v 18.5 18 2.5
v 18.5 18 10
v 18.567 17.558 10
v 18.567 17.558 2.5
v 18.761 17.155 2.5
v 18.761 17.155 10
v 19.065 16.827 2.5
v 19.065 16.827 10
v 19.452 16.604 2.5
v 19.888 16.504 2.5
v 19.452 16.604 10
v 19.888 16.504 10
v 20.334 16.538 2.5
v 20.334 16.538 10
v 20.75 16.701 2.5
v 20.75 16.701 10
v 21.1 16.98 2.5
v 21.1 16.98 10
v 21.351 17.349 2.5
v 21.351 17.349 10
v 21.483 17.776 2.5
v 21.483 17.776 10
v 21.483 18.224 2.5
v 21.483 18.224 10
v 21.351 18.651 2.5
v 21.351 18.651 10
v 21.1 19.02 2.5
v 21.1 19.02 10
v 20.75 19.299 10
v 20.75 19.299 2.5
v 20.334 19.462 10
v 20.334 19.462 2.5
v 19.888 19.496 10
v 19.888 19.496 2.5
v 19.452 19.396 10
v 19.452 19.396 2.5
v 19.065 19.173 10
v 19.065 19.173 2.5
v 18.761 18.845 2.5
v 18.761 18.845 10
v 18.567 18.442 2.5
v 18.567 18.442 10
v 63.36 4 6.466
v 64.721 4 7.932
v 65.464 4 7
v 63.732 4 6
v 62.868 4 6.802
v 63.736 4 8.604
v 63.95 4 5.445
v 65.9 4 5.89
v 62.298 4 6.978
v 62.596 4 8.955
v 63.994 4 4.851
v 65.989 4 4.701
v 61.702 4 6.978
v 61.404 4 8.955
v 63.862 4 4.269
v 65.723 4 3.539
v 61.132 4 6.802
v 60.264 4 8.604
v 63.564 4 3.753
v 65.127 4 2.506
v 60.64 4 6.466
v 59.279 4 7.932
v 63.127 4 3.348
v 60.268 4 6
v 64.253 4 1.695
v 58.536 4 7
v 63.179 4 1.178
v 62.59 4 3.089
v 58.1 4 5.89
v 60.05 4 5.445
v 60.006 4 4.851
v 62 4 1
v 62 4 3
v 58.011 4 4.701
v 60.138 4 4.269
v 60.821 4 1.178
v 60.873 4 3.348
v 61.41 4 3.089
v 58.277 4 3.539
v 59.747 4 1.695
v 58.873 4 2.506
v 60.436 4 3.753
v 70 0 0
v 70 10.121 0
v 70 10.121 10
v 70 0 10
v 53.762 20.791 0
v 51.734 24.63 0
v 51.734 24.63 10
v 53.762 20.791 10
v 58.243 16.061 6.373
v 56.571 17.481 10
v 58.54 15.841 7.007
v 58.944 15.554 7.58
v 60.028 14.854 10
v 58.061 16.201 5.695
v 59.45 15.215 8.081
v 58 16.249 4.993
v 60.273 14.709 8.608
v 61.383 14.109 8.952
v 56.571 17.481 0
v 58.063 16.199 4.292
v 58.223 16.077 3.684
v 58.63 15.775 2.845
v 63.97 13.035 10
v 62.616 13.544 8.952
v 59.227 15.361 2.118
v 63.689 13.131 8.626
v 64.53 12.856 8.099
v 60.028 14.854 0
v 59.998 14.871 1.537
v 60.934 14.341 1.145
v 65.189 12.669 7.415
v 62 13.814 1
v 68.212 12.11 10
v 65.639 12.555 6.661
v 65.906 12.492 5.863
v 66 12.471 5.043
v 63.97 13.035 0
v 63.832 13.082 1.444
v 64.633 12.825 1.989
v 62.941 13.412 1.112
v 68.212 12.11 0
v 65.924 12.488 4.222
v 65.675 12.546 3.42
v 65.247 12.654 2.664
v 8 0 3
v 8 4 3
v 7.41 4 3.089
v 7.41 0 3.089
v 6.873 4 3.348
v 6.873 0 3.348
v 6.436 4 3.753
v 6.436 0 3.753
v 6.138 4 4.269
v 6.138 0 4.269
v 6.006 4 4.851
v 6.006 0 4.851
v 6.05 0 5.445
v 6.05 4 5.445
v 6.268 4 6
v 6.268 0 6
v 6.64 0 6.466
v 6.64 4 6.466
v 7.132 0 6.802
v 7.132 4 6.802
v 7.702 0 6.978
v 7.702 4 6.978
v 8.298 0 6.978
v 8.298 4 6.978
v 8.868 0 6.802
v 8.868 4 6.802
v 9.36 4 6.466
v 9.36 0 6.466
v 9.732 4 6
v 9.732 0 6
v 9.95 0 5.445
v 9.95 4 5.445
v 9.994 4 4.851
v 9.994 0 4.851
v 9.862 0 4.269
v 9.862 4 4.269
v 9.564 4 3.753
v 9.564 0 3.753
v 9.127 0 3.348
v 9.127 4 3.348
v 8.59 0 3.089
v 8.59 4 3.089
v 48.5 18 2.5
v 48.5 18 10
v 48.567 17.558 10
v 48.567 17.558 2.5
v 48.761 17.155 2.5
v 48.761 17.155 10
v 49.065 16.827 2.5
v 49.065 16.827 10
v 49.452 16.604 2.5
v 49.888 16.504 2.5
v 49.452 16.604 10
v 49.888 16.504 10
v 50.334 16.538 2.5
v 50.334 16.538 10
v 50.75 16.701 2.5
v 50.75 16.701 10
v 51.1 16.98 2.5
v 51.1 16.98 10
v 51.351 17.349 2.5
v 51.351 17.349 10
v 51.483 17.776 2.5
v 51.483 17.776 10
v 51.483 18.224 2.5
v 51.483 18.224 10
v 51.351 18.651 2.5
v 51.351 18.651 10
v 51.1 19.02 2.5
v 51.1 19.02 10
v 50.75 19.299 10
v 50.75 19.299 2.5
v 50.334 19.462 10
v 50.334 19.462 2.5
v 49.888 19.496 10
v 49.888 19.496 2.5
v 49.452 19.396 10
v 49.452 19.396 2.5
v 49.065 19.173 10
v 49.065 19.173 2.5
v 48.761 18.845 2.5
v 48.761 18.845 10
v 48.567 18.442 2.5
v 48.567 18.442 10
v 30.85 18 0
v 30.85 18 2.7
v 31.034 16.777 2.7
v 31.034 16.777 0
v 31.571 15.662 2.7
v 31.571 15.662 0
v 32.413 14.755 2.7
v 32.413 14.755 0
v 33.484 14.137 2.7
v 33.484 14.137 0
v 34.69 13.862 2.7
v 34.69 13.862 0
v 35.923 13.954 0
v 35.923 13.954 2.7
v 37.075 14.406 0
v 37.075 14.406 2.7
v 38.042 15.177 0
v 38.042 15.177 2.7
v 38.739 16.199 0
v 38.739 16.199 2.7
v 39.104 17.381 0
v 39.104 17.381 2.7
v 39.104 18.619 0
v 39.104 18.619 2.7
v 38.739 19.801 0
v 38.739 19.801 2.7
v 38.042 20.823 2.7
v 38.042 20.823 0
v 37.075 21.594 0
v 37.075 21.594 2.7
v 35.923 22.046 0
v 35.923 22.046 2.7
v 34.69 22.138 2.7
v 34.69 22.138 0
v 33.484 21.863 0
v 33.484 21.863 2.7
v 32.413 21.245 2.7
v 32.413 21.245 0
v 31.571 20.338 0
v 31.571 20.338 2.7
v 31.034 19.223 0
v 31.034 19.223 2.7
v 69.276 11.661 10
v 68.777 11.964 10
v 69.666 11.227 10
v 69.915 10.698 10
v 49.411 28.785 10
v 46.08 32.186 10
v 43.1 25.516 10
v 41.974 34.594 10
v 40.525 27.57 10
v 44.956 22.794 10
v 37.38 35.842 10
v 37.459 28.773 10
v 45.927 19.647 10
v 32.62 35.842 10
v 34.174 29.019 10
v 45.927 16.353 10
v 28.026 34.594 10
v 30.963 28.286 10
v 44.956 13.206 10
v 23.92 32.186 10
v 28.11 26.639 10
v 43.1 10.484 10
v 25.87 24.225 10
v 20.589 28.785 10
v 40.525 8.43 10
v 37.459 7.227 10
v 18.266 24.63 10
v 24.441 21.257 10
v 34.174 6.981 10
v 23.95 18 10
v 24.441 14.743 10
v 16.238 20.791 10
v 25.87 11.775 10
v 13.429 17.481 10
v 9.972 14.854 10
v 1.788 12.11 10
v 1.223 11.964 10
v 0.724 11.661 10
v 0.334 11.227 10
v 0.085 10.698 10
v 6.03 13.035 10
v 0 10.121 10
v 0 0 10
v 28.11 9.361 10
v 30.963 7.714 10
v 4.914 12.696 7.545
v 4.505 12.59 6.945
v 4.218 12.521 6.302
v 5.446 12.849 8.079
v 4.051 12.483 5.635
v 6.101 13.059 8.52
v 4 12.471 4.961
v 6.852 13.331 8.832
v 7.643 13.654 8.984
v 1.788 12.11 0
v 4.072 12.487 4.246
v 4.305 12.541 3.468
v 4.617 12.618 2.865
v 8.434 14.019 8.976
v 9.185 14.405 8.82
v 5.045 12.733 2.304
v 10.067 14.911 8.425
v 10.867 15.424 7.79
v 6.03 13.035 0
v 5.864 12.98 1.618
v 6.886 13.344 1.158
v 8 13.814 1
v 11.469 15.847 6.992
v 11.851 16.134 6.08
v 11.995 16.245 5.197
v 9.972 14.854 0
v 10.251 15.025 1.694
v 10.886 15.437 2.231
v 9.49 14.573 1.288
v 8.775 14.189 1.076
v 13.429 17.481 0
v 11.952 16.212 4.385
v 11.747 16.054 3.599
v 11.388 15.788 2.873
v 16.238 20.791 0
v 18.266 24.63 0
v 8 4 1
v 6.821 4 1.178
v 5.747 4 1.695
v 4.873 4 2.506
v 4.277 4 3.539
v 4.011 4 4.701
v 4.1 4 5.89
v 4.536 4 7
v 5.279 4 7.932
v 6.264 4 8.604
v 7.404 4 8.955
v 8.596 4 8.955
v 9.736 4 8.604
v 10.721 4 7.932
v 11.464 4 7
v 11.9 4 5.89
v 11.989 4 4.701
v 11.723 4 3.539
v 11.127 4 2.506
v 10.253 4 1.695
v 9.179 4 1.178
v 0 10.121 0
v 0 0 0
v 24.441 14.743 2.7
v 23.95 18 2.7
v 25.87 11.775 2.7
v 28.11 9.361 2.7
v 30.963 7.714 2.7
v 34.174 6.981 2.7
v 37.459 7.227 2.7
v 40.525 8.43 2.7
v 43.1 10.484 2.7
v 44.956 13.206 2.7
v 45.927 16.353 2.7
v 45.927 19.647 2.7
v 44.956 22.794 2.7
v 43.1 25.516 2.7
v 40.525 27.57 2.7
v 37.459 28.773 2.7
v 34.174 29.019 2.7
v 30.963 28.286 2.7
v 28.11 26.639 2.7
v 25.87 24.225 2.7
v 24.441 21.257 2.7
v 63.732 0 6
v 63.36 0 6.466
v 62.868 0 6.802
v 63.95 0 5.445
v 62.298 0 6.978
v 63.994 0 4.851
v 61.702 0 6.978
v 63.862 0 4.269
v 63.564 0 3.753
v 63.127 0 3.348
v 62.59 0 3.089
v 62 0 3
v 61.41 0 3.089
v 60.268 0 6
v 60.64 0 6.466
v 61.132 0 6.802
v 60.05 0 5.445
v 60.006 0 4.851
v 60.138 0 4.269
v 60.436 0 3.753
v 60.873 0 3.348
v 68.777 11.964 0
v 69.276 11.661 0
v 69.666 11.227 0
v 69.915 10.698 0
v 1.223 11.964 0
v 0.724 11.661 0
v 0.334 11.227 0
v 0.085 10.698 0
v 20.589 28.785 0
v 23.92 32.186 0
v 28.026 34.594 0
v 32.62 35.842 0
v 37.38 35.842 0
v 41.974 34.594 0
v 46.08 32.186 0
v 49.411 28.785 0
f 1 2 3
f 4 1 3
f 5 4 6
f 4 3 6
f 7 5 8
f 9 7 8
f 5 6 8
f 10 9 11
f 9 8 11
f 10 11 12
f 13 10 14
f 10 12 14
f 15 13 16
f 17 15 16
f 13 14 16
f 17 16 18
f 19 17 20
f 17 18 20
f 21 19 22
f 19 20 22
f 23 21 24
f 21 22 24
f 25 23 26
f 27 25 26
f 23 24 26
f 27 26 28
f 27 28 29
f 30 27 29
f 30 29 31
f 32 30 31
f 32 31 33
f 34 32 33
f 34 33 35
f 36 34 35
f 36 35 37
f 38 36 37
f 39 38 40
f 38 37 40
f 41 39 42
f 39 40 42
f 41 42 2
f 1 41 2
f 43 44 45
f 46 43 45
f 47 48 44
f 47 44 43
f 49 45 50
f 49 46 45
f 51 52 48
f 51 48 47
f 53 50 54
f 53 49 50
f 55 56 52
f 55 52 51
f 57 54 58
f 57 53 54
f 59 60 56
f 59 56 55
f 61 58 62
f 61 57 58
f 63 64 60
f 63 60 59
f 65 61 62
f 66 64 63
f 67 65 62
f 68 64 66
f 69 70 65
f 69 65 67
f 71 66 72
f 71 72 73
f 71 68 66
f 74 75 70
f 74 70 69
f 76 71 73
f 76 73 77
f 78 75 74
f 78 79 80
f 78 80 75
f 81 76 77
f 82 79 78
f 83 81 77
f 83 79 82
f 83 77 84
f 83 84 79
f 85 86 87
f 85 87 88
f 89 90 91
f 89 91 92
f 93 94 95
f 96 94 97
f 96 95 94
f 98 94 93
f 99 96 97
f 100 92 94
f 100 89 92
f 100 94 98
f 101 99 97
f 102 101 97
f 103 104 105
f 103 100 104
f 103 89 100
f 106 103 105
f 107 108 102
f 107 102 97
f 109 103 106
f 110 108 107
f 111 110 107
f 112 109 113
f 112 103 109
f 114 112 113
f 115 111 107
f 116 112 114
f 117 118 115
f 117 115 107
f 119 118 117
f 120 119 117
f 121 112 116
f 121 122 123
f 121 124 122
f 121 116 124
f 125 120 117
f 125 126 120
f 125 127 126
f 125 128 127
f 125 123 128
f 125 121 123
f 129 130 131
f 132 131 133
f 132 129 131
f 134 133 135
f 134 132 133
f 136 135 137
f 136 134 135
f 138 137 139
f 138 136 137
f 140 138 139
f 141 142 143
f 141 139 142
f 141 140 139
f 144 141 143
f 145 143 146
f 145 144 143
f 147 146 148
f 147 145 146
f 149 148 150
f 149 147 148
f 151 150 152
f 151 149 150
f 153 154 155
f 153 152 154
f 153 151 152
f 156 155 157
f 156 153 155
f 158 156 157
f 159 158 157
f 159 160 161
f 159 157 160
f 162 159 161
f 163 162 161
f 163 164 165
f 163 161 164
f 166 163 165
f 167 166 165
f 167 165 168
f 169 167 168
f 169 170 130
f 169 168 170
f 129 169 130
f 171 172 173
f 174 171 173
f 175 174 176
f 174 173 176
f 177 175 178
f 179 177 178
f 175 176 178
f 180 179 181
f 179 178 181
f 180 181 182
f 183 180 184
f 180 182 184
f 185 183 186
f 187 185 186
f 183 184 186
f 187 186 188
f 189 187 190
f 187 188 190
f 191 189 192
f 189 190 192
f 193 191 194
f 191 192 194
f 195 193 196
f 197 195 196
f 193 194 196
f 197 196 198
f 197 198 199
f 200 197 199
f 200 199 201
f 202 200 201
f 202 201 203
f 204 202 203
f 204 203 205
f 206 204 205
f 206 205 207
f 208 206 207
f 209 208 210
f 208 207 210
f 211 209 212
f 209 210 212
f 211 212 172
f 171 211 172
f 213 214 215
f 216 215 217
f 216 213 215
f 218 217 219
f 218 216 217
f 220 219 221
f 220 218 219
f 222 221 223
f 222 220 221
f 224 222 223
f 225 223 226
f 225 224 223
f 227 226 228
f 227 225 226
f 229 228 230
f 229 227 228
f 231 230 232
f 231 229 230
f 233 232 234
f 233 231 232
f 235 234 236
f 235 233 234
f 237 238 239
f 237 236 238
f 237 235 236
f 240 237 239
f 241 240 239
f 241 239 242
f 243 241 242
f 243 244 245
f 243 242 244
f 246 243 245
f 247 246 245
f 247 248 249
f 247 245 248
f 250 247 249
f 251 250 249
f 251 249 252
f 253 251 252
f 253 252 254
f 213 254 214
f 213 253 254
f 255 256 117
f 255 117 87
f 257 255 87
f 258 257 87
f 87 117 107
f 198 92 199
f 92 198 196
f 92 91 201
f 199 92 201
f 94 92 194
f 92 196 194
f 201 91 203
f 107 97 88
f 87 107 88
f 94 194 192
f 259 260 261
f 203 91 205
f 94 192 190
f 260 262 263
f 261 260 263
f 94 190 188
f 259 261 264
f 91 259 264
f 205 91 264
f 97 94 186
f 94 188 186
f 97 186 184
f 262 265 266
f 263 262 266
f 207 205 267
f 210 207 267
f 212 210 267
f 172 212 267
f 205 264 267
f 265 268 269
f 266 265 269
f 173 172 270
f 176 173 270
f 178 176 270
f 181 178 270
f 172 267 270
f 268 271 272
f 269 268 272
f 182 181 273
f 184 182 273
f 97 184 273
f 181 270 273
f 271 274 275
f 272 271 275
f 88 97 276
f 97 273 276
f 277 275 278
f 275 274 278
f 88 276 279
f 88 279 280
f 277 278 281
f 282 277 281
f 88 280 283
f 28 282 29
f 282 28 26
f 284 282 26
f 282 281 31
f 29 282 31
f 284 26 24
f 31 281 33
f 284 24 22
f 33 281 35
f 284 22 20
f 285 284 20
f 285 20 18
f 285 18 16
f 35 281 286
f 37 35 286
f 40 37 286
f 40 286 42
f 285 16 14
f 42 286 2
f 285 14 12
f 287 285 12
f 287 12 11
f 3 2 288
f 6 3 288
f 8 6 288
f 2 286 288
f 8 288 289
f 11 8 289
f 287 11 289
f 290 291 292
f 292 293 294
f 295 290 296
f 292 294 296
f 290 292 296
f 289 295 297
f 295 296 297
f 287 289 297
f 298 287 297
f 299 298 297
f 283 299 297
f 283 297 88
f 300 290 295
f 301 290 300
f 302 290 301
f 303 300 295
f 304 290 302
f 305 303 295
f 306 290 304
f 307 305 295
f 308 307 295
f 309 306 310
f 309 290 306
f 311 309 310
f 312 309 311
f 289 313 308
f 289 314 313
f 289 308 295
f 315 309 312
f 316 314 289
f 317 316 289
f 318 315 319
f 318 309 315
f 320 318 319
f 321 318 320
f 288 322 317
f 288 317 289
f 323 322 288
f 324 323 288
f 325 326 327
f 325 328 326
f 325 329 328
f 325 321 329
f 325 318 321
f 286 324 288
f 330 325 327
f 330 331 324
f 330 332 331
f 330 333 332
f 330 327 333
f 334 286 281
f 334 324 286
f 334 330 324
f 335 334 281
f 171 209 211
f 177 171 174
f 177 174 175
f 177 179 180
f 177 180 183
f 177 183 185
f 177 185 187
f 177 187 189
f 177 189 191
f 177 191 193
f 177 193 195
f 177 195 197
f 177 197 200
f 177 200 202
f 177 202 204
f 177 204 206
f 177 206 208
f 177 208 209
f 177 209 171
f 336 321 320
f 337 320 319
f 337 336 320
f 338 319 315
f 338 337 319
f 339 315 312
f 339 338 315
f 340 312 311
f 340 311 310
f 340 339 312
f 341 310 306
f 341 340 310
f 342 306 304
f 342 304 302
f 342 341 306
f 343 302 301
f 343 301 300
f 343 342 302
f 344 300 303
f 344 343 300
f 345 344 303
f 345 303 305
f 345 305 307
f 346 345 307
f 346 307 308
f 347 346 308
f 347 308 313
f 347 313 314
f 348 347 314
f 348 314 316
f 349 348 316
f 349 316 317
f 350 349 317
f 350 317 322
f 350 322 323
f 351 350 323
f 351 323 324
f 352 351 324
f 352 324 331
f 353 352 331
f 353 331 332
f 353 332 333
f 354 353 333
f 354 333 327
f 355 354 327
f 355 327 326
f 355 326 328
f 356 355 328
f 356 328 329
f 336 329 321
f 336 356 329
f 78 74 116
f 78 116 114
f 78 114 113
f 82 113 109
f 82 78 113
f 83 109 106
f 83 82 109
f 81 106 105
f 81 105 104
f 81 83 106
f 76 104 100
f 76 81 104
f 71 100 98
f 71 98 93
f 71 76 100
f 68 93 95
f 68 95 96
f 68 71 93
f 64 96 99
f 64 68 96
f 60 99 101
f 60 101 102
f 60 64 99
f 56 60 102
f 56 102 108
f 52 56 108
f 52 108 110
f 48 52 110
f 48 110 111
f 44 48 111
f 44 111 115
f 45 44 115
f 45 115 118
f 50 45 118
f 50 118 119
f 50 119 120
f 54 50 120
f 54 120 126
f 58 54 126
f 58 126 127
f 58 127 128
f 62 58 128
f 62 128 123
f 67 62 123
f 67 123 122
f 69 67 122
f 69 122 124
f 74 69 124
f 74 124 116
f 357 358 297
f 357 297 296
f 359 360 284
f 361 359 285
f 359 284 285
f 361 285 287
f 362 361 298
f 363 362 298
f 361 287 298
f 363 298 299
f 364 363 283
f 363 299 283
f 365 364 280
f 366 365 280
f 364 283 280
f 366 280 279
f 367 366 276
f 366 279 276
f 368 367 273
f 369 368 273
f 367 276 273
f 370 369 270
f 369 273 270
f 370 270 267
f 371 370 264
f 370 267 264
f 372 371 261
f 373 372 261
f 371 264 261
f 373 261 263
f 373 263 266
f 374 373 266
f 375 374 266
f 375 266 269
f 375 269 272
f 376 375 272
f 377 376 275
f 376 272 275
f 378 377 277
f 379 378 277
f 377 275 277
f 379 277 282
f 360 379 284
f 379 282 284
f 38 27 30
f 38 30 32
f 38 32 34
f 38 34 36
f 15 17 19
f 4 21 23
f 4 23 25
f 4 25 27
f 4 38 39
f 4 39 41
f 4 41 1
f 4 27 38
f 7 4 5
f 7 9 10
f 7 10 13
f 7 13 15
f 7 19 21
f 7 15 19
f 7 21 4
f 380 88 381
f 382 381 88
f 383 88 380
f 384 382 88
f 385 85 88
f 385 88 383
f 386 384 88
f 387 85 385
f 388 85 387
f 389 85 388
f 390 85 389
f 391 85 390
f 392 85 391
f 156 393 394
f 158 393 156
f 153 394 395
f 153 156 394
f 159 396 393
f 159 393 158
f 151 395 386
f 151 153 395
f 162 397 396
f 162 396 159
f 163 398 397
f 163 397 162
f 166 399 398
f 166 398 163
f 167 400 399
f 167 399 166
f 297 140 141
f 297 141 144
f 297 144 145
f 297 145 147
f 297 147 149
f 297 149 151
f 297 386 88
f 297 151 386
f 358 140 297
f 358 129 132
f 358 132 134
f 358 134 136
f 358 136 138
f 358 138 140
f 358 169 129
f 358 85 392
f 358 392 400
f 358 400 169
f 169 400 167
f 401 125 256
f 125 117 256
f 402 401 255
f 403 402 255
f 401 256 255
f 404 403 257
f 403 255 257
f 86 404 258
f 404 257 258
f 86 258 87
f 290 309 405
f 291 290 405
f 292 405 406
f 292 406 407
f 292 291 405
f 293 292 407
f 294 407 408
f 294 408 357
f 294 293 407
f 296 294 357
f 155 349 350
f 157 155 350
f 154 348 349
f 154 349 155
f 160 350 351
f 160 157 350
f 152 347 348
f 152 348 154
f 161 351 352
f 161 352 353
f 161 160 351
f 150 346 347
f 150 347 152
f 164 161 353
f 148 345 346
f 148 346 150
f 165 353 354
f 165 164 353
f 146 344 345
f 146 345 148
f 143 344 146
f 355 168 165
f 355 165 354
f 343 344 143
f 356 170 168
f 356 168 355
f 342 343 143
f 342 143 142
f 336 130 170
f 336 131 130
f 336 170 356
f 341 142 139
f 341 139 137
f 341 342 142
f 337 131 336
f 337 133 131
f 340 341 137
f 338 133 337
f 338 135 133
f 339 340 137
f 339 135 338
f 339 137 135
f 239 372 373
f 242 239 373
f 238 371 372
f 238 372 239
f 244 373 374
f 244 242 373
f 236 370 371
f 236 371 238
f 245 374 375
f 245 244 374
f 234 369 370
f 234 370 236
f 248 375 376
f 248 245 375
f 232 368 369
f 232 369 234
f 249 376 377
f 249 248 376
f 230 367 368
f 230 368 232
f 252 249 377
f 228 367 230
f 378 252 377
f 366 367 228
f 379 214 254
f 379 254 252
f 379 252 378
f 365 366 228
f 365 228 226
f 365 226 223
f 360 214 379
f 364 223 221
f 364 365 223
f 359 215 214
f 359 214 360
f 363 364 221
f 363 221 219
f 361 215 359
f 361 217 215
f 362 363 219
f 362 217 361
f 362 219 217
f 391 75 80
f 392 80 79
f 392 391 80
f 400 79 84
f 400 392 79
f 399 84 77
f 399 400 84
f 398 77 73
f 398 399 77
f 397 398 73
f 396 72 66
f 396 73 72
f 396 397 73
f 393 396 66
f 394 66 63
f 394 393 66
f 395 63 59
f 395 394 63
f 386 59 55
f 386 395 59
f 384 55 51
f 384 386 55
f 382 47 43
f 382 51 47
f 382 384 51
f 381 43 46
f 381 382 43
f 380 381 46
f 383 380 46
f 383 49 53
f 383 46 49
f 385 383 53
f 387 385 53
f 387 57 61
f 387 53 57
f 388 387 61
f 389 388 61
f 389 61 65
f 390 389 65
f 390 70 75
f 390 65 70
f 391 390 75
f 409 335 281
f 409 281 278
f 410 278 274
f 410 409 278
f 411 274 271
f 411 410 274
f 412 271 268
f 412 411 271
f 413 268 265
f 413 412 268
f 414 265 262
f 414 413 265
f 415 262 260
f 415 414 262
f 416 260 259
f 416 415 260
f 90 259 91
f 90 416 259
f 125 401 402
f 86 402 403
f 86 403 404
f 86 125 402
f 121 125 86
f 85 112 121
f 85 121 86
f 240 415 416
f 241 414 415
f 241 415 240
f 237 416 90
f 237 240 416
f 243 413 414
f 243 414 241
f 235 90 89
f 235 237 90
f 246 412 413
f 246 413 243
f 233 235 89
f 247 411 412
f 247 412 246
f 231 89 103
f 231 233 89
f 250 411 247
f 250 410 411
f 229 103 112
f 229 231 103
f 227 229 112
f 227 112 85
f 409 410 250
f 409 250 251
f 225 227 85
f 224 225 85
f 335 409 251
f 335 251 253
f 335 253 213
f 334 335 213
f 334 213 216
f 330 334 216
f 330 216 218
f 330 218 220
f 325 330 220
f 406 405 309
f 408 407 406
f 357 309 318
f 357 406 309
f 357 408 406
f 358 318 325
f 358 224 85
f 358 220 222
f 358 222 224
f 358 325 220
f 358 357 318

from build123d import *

# Parameters (mm, degrees)
BOSS_EXTRUDE1_DEPTH = 10
FILLET1_R           = 20
CUT_EXTRUDE1_START  = 10
SKETCH2_R           = 11.05
CUT_EXTRUDE1_DEPTH  = 7.3
SKETCH5_R           = 4.15
CUT_EXTRUDE2_DEPTH  = 10
FILLET2_R           = 2
CUT_EXTRUDE3_START  = 4
SKETCH6_R           = 4
CUT_EXTRUDE3_DEPTH  = 13
SKETCH7_R           = 2
CUT_EXTRUDE4_DEPTH  = 13
CUT_EXTRUDE5_START  = 10
SKETCH9_R           = 1.5
CUT_EXTRUDE5_DEPTH  = 7.5


with BuildPart() as part:
    # Sketch1 → Boss-Extrude1 (new body)
    with BuildSketch(Plane.XY):
        with BuildLine():
            Line((0, 12), (18.029437252, 12))
            ThreePointArc((18.029437252, 12), (35, 36), (51.970562748, 12))
            Line((51.970562748, 12), (70, 12))
            Line((70, 12), (70, 0))
            Line((70, 0), (0, 0))
            Line((0, 0), (0, 12))
        make_face()
    extrude(amount=BOSS_EXTRUDE1_DEPTH)

    # Fillet1
    # the kernel refuses this fillet: 20 mm, written as the material it adds along each edge
    with BuildSketch(Plane(origin=(18.029437252, 12, 0), x_dir=(-1, 0, 0), z_dir=(0, 0, 1))) as fillet1_piece_1:
        with BuildLine():
            CenterArc((18.357547265, -19.997308414), FILLET1_R, 90.94000812, 67.446084787)
            Line((-0.236194847, -12.630303986), (-0.608069689, -12.482963897))
            ThreePointArc((-0.608069689, -12.482963897), (0.626360574, -6.329073839), (-0.377123617, -0.133333333))
            Line((-0.377123617, -0.133333333), (0, 0.4))
            ThreePointArc((0, 0.4), (9.014718626, 0.4), (18.022875051, 0.399946168))
            Line((18.022875051, 0.399946168), (18.029437252, 0))
        make_face()
    extrude(amount=10)
    with BuildSketch(Plane(origin=(51.970562748, 12, 0), x_dir=(-0.018697377190164018, 0.9998251887636201, 0), z_dir=(0, 0, 1))) as fillet1_piece_2:
        with BuildLine():
            CenterArc((19.650574675, -18.728235378), FILLET1_R, 110.542563864, 67.446084787)
            Line((-0.337103189, -18.026285503), (-0.736856746, -18.012246506))
            ThreePointArc((-0.736856746, -18.012246506), (-0.56848167, -9.005663801), (-0.399930076, 0.007478951))
            Line((-0.399930076, 0.007478951), (0.140361248, 0.374564708))
            ThreePointArc((0.140361248, 0.374564708), (6.316256145, -0.74458816), (12.492151043, 0.374564708))
            Line((12.492151043, 0.374564708), (12.632512291, 0))
        make_face()
    extrude(amount=10)

    # Sketch2 → Cut-Extrude1 (cut)
    with BuildSketch(Plane.XY.offset(CUT_EXTRUDE1_START)):
        with Locations(Location((35, 18, 0), (0, 0, 180))):
            Circle(SKETCH2_R)
    extrude(amount=-CUT_EXTRUDE1_DEPTH, mode=Mode.SUBTRACT)

    # Sketch5 → Cut-Extrude2 (cut)
    with BuildSketch(Plane.XY):
        with Locations(Location((35, 18, 0), (0, 0, 180))):
            Circle(SKETCH5_R)
    extrude(amount=CUT_EXTRUDE2_DEPTH, mode=Mode.SUBTRACT)

    # Fillet2
    fillet2_edges = [part.edges().sort_by_distance(p)[0] for p in [
        (0, 12, 5),
        (70, 12, 5),
    ]]
    fillet(fillet2_edges, radius=FILLET2_R)

    # Sketch6 → Cut-Extrude3 (cut)
    with BuildSketch(Plane(origin=(0, 0, 0), x_dir=(1, 0, 0), z_dir=(0, 1, 0)).offset(CUT_EXTRUDE3_START)):
        with Locations(Location((8, -5, 0), (0, 0, 90))):
            Circle(SKETCH6_R)
        with Locations(Location((62, -5, 0), (0, 0, 90))):
            Circle(SKETCH6_R)
    extrude(amount=CUT_EXTRUDE3_DEPTH, mode=Mode.SUBTRACT)

    # Sketch7 → Cut-Extrude4 (cut)
    with BuildSketch(Plane(origin=(0, 0, 0), x_dir=(1, 0, 0), z_dir=(0, 1, 0))):
        with Locations(Location((8, -5, 0), (0, 0, 90))):
            Circle(SKETCH7_R)
        with Locations(Location((62, -5, 0), (0, 0, 90))):
            Circle(SKETCH7_R)
    extrude(amount=CUT_EXTRUDE4_DEPTH, mode=Mode.SUBTRACT)

    # Sketch9 → Cut-Extrude5 (cut)
    with BuildSketch(Plane.XY.offset(CUT_EXTRUDE5_START)):
        with Locations(Location((20, 18, 0), (0, 0, 180))):
            Circle(SKETCH9_R)
        with Locations(Location((50, 18, 0), (0, 0, 180))):
            Circle(SKETCH9_R)
    extrude(amount=-CUT_EXTRUDE5_DEPTH, mode=Mode.SUBTRACT)


solid = part.part
